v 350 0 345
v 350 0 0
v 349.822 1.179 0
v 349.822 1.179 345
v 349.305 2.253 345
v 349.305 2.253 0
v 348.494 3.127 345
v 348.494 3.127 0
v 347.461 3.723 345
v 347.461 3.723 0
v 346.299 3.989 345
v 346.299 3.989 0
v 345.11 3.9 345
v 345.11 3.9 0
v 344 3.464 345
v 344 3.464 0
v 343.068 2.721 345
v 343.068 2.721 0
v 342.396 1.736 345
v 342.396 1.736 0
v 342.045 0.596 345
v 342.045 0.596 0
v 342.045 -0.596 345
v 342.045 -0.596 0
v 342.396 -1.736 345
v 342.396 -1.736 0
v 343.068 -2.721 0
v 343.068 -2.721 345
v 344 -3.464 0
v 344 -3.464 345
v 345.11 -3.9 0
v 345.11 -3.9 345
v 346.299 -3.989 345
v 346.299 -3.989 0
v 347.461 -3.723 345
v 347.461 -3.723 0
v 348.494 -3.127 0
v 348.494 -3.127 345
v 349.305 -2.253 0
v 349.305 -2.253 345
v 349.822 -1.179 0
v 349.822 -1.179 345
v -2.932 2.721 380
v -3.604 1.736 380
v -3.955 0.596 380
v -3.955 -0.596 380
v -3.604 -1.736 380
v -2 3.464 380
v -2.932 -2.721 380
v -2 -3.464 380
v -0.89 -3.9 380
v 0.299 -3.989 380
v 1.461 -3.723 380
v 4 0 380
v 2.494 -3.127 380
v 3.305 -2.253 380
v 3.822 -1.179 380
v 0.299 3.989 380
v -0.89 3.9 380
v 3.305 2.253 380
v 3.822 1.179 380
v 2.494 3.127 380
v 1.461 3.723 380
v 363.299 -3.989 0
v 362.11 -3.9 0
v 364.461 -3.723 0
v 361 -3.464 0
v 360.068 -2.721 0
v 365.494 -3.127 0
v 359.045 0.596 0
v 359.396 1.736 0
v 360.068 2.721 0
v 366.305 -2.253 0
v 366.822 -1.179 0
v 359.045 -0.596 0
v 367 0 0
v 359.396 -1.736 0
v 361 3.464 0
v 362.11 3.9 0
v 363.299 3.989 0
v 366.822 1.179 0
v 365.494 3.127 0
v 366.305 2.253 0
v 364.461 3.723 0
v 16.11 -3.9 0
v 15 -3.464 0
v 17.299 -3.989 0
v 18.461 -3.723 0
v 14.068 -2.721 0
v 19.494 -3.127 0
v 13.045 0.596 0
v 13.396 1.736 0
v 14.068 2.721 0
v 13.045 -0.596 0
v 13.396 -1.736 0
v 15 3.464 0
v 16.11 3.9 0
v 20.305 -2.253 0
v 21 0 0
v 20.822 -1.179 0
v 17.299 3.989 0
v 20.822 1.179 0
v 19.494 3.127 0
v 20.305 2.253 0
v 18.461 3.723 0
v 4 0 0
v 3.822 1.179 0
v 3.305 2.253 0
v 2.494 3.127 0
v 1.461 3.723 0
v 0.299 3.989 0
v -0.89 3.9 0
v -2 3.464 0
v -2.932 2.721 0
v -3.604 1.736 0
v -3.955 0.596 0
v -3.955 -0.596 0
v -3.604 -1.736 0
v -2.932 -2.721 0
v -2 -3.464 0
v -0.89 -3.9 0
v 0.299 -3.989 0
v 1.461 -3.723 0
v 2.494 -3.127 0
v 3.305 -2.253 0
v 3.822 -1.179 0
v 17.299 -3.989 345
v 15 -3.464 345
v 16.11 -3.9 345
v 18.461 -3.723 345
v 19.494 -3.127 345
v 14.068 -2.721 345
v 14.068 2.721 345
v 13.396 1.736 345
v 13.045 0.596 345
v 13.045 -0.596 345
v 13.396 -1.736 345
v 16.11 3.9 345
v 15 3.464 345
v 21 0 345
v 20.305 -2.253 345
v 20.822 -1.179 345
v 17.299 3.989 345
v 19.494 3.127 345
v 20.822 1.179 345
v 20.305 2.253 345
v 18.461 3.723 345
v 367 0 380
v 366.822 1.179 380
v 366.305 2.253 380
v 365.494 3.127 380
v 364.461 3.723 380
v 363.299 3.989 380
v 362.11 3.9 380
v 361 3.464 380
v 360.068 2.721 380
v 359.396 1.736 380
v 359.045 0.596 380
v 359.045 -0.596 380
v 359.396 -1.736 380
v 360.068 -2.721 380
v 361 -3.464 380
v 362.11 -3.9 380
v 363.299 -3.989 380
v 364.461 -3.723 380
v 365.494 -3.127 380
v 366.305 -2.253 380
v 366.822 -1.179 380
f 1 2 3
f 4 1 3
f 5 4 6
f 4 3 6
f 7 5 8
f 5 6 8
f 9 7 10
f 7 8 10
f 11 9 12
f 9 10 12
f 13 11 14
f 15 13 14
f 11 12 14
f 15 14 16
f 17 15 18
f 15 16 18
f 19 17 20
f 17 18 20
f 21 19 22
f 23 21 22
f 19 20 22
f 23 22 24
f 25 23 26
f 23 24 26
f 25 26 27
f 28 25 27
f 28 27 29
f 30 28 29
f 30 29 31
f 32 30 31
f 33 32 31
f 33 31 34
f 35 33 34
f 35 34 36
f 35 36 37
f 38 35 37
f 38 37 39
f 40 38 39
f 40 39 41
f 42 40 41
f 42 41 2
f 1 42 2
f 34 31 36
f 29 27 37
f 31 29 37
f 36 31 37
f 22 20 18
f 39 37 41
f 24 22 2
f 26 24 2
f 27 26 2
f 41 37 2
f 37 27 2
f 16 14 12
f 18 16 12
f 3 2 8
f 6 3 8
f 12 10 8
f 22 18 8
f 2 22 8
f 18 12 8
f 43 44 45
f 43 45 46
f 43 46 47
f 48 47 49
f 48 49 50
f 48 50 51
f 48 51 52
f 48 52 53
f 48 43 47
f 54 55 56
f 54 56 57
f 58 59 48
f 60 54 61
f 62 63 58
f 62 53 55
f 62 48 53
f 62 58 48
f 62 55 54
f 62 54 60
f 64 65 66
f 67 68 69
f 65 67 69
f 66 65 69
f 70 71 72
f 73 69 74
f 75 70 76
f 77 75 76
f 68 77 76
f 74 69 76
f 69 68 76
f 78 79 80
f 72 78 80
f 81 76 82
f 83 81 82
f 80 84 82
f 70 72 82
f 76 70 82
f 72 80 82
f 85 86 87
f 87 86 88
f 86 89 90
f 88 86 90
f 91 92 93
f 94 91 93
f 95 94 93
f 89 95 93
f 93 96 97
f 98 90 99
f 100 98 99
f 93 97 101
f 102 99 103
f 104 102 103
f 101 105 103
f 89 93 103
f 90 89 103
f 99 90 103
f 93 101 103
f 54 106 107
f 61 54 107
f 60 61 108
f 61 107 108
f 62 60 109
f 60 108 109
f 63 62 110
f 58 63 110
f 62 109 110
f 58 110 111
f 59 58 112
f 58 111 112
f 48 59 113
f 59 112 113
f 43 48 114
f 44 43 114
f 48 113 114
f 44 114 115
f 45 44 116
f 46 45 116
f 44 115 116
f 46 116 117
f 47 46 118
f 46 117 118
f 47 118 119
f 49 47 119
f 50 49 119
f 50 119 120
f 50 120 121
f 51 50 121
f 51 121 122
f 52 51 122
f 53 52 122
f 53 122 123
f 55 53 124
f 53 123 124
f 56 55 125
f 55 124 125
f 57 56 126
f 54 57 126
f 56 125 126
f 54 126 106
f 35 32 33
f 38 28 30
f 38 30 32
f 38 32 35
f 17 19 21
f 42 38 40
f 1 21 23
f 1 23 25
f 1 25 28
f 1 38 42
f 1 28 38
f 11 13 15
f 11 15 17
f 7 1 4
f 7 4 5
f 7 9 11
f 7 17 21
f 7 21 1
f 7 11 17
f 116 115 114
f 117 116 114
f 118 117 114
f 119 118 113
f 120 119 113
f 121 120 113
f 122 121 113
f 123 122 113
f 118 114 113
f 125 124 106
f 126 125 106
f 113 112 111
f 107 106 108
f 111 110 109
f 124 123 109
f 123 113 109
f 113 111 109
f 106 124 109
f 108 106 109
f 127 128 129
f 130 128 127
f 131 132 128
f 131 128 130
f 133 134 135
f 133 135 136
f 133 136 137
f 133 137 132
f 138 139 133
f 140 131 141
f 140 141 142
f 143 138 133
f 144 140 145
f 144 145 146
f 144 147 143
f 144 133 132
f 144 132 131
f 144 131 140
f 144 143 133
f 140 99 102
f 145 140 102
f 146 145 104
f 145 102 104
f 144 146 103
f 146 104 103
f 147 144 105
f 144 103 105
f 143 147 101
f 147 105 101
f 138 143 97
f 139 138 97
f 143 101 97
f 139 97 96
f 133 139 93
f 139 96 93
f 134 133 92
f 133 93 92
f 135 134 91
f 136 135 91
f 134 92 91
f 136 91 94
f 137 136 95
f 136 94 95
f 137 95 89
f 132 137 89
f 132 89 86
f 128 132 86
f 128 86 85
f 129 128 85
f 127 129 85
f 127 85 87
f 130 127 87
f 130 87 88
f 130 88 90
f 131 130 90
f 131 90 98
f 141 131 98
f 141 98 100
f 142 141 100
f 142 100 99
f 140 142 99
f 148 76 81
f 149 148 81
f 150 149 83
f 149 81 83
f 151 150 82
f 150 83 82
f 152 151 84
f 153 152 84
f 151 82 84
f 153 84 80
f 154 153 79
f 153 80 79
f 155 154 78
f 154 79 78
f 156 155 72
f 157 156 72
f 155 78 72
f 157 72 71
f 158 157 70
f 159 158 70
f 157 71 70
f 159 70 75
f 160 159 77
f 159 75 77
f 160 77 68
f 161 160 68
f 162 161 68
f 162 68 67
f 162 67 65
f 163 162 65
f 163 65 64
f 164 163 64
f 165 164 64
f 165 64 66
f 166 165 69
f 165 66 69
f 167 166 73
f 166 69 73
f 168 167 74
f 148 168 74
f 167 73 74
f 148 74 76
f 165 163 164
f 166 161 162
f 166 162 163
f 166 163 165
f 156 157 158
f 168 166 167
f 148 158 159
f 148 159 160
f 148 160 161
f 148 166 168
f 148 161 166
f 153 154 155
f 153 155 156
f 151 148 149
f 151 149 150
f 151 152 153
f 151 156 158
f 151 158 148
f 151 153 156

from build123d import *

# Parameters (mm, degrees)
F0_R      = 4
F1_DEPTH  = 380
F1_FACE_R = 4
F2_DEPTH  = 35
F3_DEPTH  = 35


with BuildPart() as f1:
    # F0 (on Top) → F1 (new body)
    with BuildSketch(Plane.XY):
        with Locations((17, 0)):
            Circle(F0_R)
        Circle(F0_R)
        with Locations((346, 0)):
            Circle(F0_R)
        with Locations((363, 0)):
            Circle(F0_R)
    extrude(amount=F1_DEPTH)

    # F1_face (on face) → F2 (cut)
    with BuildSketch(Plane(origin=(17, 0, 380), x_dir=(1, 0, 0), z_dir=(0, 0, 1))):
        Circle(F1_FACE_R)
    extrude(amount=-F2_DEPTH, mode=Mode.SUBTRACT)

    # F1_face (on face) → F3 (cut)
    with BuildSketch(Plane(origin=(17, 0, 380), x_dir=(1, 0, 0), z_dir=(0, 0, 1))):
        with Locations((329, 0)):
            Circle(F1_FACE_R)
    extrude(amount=-F3_DEPTH, mode=Mode.SUBTRACT)


solid = f1.part
